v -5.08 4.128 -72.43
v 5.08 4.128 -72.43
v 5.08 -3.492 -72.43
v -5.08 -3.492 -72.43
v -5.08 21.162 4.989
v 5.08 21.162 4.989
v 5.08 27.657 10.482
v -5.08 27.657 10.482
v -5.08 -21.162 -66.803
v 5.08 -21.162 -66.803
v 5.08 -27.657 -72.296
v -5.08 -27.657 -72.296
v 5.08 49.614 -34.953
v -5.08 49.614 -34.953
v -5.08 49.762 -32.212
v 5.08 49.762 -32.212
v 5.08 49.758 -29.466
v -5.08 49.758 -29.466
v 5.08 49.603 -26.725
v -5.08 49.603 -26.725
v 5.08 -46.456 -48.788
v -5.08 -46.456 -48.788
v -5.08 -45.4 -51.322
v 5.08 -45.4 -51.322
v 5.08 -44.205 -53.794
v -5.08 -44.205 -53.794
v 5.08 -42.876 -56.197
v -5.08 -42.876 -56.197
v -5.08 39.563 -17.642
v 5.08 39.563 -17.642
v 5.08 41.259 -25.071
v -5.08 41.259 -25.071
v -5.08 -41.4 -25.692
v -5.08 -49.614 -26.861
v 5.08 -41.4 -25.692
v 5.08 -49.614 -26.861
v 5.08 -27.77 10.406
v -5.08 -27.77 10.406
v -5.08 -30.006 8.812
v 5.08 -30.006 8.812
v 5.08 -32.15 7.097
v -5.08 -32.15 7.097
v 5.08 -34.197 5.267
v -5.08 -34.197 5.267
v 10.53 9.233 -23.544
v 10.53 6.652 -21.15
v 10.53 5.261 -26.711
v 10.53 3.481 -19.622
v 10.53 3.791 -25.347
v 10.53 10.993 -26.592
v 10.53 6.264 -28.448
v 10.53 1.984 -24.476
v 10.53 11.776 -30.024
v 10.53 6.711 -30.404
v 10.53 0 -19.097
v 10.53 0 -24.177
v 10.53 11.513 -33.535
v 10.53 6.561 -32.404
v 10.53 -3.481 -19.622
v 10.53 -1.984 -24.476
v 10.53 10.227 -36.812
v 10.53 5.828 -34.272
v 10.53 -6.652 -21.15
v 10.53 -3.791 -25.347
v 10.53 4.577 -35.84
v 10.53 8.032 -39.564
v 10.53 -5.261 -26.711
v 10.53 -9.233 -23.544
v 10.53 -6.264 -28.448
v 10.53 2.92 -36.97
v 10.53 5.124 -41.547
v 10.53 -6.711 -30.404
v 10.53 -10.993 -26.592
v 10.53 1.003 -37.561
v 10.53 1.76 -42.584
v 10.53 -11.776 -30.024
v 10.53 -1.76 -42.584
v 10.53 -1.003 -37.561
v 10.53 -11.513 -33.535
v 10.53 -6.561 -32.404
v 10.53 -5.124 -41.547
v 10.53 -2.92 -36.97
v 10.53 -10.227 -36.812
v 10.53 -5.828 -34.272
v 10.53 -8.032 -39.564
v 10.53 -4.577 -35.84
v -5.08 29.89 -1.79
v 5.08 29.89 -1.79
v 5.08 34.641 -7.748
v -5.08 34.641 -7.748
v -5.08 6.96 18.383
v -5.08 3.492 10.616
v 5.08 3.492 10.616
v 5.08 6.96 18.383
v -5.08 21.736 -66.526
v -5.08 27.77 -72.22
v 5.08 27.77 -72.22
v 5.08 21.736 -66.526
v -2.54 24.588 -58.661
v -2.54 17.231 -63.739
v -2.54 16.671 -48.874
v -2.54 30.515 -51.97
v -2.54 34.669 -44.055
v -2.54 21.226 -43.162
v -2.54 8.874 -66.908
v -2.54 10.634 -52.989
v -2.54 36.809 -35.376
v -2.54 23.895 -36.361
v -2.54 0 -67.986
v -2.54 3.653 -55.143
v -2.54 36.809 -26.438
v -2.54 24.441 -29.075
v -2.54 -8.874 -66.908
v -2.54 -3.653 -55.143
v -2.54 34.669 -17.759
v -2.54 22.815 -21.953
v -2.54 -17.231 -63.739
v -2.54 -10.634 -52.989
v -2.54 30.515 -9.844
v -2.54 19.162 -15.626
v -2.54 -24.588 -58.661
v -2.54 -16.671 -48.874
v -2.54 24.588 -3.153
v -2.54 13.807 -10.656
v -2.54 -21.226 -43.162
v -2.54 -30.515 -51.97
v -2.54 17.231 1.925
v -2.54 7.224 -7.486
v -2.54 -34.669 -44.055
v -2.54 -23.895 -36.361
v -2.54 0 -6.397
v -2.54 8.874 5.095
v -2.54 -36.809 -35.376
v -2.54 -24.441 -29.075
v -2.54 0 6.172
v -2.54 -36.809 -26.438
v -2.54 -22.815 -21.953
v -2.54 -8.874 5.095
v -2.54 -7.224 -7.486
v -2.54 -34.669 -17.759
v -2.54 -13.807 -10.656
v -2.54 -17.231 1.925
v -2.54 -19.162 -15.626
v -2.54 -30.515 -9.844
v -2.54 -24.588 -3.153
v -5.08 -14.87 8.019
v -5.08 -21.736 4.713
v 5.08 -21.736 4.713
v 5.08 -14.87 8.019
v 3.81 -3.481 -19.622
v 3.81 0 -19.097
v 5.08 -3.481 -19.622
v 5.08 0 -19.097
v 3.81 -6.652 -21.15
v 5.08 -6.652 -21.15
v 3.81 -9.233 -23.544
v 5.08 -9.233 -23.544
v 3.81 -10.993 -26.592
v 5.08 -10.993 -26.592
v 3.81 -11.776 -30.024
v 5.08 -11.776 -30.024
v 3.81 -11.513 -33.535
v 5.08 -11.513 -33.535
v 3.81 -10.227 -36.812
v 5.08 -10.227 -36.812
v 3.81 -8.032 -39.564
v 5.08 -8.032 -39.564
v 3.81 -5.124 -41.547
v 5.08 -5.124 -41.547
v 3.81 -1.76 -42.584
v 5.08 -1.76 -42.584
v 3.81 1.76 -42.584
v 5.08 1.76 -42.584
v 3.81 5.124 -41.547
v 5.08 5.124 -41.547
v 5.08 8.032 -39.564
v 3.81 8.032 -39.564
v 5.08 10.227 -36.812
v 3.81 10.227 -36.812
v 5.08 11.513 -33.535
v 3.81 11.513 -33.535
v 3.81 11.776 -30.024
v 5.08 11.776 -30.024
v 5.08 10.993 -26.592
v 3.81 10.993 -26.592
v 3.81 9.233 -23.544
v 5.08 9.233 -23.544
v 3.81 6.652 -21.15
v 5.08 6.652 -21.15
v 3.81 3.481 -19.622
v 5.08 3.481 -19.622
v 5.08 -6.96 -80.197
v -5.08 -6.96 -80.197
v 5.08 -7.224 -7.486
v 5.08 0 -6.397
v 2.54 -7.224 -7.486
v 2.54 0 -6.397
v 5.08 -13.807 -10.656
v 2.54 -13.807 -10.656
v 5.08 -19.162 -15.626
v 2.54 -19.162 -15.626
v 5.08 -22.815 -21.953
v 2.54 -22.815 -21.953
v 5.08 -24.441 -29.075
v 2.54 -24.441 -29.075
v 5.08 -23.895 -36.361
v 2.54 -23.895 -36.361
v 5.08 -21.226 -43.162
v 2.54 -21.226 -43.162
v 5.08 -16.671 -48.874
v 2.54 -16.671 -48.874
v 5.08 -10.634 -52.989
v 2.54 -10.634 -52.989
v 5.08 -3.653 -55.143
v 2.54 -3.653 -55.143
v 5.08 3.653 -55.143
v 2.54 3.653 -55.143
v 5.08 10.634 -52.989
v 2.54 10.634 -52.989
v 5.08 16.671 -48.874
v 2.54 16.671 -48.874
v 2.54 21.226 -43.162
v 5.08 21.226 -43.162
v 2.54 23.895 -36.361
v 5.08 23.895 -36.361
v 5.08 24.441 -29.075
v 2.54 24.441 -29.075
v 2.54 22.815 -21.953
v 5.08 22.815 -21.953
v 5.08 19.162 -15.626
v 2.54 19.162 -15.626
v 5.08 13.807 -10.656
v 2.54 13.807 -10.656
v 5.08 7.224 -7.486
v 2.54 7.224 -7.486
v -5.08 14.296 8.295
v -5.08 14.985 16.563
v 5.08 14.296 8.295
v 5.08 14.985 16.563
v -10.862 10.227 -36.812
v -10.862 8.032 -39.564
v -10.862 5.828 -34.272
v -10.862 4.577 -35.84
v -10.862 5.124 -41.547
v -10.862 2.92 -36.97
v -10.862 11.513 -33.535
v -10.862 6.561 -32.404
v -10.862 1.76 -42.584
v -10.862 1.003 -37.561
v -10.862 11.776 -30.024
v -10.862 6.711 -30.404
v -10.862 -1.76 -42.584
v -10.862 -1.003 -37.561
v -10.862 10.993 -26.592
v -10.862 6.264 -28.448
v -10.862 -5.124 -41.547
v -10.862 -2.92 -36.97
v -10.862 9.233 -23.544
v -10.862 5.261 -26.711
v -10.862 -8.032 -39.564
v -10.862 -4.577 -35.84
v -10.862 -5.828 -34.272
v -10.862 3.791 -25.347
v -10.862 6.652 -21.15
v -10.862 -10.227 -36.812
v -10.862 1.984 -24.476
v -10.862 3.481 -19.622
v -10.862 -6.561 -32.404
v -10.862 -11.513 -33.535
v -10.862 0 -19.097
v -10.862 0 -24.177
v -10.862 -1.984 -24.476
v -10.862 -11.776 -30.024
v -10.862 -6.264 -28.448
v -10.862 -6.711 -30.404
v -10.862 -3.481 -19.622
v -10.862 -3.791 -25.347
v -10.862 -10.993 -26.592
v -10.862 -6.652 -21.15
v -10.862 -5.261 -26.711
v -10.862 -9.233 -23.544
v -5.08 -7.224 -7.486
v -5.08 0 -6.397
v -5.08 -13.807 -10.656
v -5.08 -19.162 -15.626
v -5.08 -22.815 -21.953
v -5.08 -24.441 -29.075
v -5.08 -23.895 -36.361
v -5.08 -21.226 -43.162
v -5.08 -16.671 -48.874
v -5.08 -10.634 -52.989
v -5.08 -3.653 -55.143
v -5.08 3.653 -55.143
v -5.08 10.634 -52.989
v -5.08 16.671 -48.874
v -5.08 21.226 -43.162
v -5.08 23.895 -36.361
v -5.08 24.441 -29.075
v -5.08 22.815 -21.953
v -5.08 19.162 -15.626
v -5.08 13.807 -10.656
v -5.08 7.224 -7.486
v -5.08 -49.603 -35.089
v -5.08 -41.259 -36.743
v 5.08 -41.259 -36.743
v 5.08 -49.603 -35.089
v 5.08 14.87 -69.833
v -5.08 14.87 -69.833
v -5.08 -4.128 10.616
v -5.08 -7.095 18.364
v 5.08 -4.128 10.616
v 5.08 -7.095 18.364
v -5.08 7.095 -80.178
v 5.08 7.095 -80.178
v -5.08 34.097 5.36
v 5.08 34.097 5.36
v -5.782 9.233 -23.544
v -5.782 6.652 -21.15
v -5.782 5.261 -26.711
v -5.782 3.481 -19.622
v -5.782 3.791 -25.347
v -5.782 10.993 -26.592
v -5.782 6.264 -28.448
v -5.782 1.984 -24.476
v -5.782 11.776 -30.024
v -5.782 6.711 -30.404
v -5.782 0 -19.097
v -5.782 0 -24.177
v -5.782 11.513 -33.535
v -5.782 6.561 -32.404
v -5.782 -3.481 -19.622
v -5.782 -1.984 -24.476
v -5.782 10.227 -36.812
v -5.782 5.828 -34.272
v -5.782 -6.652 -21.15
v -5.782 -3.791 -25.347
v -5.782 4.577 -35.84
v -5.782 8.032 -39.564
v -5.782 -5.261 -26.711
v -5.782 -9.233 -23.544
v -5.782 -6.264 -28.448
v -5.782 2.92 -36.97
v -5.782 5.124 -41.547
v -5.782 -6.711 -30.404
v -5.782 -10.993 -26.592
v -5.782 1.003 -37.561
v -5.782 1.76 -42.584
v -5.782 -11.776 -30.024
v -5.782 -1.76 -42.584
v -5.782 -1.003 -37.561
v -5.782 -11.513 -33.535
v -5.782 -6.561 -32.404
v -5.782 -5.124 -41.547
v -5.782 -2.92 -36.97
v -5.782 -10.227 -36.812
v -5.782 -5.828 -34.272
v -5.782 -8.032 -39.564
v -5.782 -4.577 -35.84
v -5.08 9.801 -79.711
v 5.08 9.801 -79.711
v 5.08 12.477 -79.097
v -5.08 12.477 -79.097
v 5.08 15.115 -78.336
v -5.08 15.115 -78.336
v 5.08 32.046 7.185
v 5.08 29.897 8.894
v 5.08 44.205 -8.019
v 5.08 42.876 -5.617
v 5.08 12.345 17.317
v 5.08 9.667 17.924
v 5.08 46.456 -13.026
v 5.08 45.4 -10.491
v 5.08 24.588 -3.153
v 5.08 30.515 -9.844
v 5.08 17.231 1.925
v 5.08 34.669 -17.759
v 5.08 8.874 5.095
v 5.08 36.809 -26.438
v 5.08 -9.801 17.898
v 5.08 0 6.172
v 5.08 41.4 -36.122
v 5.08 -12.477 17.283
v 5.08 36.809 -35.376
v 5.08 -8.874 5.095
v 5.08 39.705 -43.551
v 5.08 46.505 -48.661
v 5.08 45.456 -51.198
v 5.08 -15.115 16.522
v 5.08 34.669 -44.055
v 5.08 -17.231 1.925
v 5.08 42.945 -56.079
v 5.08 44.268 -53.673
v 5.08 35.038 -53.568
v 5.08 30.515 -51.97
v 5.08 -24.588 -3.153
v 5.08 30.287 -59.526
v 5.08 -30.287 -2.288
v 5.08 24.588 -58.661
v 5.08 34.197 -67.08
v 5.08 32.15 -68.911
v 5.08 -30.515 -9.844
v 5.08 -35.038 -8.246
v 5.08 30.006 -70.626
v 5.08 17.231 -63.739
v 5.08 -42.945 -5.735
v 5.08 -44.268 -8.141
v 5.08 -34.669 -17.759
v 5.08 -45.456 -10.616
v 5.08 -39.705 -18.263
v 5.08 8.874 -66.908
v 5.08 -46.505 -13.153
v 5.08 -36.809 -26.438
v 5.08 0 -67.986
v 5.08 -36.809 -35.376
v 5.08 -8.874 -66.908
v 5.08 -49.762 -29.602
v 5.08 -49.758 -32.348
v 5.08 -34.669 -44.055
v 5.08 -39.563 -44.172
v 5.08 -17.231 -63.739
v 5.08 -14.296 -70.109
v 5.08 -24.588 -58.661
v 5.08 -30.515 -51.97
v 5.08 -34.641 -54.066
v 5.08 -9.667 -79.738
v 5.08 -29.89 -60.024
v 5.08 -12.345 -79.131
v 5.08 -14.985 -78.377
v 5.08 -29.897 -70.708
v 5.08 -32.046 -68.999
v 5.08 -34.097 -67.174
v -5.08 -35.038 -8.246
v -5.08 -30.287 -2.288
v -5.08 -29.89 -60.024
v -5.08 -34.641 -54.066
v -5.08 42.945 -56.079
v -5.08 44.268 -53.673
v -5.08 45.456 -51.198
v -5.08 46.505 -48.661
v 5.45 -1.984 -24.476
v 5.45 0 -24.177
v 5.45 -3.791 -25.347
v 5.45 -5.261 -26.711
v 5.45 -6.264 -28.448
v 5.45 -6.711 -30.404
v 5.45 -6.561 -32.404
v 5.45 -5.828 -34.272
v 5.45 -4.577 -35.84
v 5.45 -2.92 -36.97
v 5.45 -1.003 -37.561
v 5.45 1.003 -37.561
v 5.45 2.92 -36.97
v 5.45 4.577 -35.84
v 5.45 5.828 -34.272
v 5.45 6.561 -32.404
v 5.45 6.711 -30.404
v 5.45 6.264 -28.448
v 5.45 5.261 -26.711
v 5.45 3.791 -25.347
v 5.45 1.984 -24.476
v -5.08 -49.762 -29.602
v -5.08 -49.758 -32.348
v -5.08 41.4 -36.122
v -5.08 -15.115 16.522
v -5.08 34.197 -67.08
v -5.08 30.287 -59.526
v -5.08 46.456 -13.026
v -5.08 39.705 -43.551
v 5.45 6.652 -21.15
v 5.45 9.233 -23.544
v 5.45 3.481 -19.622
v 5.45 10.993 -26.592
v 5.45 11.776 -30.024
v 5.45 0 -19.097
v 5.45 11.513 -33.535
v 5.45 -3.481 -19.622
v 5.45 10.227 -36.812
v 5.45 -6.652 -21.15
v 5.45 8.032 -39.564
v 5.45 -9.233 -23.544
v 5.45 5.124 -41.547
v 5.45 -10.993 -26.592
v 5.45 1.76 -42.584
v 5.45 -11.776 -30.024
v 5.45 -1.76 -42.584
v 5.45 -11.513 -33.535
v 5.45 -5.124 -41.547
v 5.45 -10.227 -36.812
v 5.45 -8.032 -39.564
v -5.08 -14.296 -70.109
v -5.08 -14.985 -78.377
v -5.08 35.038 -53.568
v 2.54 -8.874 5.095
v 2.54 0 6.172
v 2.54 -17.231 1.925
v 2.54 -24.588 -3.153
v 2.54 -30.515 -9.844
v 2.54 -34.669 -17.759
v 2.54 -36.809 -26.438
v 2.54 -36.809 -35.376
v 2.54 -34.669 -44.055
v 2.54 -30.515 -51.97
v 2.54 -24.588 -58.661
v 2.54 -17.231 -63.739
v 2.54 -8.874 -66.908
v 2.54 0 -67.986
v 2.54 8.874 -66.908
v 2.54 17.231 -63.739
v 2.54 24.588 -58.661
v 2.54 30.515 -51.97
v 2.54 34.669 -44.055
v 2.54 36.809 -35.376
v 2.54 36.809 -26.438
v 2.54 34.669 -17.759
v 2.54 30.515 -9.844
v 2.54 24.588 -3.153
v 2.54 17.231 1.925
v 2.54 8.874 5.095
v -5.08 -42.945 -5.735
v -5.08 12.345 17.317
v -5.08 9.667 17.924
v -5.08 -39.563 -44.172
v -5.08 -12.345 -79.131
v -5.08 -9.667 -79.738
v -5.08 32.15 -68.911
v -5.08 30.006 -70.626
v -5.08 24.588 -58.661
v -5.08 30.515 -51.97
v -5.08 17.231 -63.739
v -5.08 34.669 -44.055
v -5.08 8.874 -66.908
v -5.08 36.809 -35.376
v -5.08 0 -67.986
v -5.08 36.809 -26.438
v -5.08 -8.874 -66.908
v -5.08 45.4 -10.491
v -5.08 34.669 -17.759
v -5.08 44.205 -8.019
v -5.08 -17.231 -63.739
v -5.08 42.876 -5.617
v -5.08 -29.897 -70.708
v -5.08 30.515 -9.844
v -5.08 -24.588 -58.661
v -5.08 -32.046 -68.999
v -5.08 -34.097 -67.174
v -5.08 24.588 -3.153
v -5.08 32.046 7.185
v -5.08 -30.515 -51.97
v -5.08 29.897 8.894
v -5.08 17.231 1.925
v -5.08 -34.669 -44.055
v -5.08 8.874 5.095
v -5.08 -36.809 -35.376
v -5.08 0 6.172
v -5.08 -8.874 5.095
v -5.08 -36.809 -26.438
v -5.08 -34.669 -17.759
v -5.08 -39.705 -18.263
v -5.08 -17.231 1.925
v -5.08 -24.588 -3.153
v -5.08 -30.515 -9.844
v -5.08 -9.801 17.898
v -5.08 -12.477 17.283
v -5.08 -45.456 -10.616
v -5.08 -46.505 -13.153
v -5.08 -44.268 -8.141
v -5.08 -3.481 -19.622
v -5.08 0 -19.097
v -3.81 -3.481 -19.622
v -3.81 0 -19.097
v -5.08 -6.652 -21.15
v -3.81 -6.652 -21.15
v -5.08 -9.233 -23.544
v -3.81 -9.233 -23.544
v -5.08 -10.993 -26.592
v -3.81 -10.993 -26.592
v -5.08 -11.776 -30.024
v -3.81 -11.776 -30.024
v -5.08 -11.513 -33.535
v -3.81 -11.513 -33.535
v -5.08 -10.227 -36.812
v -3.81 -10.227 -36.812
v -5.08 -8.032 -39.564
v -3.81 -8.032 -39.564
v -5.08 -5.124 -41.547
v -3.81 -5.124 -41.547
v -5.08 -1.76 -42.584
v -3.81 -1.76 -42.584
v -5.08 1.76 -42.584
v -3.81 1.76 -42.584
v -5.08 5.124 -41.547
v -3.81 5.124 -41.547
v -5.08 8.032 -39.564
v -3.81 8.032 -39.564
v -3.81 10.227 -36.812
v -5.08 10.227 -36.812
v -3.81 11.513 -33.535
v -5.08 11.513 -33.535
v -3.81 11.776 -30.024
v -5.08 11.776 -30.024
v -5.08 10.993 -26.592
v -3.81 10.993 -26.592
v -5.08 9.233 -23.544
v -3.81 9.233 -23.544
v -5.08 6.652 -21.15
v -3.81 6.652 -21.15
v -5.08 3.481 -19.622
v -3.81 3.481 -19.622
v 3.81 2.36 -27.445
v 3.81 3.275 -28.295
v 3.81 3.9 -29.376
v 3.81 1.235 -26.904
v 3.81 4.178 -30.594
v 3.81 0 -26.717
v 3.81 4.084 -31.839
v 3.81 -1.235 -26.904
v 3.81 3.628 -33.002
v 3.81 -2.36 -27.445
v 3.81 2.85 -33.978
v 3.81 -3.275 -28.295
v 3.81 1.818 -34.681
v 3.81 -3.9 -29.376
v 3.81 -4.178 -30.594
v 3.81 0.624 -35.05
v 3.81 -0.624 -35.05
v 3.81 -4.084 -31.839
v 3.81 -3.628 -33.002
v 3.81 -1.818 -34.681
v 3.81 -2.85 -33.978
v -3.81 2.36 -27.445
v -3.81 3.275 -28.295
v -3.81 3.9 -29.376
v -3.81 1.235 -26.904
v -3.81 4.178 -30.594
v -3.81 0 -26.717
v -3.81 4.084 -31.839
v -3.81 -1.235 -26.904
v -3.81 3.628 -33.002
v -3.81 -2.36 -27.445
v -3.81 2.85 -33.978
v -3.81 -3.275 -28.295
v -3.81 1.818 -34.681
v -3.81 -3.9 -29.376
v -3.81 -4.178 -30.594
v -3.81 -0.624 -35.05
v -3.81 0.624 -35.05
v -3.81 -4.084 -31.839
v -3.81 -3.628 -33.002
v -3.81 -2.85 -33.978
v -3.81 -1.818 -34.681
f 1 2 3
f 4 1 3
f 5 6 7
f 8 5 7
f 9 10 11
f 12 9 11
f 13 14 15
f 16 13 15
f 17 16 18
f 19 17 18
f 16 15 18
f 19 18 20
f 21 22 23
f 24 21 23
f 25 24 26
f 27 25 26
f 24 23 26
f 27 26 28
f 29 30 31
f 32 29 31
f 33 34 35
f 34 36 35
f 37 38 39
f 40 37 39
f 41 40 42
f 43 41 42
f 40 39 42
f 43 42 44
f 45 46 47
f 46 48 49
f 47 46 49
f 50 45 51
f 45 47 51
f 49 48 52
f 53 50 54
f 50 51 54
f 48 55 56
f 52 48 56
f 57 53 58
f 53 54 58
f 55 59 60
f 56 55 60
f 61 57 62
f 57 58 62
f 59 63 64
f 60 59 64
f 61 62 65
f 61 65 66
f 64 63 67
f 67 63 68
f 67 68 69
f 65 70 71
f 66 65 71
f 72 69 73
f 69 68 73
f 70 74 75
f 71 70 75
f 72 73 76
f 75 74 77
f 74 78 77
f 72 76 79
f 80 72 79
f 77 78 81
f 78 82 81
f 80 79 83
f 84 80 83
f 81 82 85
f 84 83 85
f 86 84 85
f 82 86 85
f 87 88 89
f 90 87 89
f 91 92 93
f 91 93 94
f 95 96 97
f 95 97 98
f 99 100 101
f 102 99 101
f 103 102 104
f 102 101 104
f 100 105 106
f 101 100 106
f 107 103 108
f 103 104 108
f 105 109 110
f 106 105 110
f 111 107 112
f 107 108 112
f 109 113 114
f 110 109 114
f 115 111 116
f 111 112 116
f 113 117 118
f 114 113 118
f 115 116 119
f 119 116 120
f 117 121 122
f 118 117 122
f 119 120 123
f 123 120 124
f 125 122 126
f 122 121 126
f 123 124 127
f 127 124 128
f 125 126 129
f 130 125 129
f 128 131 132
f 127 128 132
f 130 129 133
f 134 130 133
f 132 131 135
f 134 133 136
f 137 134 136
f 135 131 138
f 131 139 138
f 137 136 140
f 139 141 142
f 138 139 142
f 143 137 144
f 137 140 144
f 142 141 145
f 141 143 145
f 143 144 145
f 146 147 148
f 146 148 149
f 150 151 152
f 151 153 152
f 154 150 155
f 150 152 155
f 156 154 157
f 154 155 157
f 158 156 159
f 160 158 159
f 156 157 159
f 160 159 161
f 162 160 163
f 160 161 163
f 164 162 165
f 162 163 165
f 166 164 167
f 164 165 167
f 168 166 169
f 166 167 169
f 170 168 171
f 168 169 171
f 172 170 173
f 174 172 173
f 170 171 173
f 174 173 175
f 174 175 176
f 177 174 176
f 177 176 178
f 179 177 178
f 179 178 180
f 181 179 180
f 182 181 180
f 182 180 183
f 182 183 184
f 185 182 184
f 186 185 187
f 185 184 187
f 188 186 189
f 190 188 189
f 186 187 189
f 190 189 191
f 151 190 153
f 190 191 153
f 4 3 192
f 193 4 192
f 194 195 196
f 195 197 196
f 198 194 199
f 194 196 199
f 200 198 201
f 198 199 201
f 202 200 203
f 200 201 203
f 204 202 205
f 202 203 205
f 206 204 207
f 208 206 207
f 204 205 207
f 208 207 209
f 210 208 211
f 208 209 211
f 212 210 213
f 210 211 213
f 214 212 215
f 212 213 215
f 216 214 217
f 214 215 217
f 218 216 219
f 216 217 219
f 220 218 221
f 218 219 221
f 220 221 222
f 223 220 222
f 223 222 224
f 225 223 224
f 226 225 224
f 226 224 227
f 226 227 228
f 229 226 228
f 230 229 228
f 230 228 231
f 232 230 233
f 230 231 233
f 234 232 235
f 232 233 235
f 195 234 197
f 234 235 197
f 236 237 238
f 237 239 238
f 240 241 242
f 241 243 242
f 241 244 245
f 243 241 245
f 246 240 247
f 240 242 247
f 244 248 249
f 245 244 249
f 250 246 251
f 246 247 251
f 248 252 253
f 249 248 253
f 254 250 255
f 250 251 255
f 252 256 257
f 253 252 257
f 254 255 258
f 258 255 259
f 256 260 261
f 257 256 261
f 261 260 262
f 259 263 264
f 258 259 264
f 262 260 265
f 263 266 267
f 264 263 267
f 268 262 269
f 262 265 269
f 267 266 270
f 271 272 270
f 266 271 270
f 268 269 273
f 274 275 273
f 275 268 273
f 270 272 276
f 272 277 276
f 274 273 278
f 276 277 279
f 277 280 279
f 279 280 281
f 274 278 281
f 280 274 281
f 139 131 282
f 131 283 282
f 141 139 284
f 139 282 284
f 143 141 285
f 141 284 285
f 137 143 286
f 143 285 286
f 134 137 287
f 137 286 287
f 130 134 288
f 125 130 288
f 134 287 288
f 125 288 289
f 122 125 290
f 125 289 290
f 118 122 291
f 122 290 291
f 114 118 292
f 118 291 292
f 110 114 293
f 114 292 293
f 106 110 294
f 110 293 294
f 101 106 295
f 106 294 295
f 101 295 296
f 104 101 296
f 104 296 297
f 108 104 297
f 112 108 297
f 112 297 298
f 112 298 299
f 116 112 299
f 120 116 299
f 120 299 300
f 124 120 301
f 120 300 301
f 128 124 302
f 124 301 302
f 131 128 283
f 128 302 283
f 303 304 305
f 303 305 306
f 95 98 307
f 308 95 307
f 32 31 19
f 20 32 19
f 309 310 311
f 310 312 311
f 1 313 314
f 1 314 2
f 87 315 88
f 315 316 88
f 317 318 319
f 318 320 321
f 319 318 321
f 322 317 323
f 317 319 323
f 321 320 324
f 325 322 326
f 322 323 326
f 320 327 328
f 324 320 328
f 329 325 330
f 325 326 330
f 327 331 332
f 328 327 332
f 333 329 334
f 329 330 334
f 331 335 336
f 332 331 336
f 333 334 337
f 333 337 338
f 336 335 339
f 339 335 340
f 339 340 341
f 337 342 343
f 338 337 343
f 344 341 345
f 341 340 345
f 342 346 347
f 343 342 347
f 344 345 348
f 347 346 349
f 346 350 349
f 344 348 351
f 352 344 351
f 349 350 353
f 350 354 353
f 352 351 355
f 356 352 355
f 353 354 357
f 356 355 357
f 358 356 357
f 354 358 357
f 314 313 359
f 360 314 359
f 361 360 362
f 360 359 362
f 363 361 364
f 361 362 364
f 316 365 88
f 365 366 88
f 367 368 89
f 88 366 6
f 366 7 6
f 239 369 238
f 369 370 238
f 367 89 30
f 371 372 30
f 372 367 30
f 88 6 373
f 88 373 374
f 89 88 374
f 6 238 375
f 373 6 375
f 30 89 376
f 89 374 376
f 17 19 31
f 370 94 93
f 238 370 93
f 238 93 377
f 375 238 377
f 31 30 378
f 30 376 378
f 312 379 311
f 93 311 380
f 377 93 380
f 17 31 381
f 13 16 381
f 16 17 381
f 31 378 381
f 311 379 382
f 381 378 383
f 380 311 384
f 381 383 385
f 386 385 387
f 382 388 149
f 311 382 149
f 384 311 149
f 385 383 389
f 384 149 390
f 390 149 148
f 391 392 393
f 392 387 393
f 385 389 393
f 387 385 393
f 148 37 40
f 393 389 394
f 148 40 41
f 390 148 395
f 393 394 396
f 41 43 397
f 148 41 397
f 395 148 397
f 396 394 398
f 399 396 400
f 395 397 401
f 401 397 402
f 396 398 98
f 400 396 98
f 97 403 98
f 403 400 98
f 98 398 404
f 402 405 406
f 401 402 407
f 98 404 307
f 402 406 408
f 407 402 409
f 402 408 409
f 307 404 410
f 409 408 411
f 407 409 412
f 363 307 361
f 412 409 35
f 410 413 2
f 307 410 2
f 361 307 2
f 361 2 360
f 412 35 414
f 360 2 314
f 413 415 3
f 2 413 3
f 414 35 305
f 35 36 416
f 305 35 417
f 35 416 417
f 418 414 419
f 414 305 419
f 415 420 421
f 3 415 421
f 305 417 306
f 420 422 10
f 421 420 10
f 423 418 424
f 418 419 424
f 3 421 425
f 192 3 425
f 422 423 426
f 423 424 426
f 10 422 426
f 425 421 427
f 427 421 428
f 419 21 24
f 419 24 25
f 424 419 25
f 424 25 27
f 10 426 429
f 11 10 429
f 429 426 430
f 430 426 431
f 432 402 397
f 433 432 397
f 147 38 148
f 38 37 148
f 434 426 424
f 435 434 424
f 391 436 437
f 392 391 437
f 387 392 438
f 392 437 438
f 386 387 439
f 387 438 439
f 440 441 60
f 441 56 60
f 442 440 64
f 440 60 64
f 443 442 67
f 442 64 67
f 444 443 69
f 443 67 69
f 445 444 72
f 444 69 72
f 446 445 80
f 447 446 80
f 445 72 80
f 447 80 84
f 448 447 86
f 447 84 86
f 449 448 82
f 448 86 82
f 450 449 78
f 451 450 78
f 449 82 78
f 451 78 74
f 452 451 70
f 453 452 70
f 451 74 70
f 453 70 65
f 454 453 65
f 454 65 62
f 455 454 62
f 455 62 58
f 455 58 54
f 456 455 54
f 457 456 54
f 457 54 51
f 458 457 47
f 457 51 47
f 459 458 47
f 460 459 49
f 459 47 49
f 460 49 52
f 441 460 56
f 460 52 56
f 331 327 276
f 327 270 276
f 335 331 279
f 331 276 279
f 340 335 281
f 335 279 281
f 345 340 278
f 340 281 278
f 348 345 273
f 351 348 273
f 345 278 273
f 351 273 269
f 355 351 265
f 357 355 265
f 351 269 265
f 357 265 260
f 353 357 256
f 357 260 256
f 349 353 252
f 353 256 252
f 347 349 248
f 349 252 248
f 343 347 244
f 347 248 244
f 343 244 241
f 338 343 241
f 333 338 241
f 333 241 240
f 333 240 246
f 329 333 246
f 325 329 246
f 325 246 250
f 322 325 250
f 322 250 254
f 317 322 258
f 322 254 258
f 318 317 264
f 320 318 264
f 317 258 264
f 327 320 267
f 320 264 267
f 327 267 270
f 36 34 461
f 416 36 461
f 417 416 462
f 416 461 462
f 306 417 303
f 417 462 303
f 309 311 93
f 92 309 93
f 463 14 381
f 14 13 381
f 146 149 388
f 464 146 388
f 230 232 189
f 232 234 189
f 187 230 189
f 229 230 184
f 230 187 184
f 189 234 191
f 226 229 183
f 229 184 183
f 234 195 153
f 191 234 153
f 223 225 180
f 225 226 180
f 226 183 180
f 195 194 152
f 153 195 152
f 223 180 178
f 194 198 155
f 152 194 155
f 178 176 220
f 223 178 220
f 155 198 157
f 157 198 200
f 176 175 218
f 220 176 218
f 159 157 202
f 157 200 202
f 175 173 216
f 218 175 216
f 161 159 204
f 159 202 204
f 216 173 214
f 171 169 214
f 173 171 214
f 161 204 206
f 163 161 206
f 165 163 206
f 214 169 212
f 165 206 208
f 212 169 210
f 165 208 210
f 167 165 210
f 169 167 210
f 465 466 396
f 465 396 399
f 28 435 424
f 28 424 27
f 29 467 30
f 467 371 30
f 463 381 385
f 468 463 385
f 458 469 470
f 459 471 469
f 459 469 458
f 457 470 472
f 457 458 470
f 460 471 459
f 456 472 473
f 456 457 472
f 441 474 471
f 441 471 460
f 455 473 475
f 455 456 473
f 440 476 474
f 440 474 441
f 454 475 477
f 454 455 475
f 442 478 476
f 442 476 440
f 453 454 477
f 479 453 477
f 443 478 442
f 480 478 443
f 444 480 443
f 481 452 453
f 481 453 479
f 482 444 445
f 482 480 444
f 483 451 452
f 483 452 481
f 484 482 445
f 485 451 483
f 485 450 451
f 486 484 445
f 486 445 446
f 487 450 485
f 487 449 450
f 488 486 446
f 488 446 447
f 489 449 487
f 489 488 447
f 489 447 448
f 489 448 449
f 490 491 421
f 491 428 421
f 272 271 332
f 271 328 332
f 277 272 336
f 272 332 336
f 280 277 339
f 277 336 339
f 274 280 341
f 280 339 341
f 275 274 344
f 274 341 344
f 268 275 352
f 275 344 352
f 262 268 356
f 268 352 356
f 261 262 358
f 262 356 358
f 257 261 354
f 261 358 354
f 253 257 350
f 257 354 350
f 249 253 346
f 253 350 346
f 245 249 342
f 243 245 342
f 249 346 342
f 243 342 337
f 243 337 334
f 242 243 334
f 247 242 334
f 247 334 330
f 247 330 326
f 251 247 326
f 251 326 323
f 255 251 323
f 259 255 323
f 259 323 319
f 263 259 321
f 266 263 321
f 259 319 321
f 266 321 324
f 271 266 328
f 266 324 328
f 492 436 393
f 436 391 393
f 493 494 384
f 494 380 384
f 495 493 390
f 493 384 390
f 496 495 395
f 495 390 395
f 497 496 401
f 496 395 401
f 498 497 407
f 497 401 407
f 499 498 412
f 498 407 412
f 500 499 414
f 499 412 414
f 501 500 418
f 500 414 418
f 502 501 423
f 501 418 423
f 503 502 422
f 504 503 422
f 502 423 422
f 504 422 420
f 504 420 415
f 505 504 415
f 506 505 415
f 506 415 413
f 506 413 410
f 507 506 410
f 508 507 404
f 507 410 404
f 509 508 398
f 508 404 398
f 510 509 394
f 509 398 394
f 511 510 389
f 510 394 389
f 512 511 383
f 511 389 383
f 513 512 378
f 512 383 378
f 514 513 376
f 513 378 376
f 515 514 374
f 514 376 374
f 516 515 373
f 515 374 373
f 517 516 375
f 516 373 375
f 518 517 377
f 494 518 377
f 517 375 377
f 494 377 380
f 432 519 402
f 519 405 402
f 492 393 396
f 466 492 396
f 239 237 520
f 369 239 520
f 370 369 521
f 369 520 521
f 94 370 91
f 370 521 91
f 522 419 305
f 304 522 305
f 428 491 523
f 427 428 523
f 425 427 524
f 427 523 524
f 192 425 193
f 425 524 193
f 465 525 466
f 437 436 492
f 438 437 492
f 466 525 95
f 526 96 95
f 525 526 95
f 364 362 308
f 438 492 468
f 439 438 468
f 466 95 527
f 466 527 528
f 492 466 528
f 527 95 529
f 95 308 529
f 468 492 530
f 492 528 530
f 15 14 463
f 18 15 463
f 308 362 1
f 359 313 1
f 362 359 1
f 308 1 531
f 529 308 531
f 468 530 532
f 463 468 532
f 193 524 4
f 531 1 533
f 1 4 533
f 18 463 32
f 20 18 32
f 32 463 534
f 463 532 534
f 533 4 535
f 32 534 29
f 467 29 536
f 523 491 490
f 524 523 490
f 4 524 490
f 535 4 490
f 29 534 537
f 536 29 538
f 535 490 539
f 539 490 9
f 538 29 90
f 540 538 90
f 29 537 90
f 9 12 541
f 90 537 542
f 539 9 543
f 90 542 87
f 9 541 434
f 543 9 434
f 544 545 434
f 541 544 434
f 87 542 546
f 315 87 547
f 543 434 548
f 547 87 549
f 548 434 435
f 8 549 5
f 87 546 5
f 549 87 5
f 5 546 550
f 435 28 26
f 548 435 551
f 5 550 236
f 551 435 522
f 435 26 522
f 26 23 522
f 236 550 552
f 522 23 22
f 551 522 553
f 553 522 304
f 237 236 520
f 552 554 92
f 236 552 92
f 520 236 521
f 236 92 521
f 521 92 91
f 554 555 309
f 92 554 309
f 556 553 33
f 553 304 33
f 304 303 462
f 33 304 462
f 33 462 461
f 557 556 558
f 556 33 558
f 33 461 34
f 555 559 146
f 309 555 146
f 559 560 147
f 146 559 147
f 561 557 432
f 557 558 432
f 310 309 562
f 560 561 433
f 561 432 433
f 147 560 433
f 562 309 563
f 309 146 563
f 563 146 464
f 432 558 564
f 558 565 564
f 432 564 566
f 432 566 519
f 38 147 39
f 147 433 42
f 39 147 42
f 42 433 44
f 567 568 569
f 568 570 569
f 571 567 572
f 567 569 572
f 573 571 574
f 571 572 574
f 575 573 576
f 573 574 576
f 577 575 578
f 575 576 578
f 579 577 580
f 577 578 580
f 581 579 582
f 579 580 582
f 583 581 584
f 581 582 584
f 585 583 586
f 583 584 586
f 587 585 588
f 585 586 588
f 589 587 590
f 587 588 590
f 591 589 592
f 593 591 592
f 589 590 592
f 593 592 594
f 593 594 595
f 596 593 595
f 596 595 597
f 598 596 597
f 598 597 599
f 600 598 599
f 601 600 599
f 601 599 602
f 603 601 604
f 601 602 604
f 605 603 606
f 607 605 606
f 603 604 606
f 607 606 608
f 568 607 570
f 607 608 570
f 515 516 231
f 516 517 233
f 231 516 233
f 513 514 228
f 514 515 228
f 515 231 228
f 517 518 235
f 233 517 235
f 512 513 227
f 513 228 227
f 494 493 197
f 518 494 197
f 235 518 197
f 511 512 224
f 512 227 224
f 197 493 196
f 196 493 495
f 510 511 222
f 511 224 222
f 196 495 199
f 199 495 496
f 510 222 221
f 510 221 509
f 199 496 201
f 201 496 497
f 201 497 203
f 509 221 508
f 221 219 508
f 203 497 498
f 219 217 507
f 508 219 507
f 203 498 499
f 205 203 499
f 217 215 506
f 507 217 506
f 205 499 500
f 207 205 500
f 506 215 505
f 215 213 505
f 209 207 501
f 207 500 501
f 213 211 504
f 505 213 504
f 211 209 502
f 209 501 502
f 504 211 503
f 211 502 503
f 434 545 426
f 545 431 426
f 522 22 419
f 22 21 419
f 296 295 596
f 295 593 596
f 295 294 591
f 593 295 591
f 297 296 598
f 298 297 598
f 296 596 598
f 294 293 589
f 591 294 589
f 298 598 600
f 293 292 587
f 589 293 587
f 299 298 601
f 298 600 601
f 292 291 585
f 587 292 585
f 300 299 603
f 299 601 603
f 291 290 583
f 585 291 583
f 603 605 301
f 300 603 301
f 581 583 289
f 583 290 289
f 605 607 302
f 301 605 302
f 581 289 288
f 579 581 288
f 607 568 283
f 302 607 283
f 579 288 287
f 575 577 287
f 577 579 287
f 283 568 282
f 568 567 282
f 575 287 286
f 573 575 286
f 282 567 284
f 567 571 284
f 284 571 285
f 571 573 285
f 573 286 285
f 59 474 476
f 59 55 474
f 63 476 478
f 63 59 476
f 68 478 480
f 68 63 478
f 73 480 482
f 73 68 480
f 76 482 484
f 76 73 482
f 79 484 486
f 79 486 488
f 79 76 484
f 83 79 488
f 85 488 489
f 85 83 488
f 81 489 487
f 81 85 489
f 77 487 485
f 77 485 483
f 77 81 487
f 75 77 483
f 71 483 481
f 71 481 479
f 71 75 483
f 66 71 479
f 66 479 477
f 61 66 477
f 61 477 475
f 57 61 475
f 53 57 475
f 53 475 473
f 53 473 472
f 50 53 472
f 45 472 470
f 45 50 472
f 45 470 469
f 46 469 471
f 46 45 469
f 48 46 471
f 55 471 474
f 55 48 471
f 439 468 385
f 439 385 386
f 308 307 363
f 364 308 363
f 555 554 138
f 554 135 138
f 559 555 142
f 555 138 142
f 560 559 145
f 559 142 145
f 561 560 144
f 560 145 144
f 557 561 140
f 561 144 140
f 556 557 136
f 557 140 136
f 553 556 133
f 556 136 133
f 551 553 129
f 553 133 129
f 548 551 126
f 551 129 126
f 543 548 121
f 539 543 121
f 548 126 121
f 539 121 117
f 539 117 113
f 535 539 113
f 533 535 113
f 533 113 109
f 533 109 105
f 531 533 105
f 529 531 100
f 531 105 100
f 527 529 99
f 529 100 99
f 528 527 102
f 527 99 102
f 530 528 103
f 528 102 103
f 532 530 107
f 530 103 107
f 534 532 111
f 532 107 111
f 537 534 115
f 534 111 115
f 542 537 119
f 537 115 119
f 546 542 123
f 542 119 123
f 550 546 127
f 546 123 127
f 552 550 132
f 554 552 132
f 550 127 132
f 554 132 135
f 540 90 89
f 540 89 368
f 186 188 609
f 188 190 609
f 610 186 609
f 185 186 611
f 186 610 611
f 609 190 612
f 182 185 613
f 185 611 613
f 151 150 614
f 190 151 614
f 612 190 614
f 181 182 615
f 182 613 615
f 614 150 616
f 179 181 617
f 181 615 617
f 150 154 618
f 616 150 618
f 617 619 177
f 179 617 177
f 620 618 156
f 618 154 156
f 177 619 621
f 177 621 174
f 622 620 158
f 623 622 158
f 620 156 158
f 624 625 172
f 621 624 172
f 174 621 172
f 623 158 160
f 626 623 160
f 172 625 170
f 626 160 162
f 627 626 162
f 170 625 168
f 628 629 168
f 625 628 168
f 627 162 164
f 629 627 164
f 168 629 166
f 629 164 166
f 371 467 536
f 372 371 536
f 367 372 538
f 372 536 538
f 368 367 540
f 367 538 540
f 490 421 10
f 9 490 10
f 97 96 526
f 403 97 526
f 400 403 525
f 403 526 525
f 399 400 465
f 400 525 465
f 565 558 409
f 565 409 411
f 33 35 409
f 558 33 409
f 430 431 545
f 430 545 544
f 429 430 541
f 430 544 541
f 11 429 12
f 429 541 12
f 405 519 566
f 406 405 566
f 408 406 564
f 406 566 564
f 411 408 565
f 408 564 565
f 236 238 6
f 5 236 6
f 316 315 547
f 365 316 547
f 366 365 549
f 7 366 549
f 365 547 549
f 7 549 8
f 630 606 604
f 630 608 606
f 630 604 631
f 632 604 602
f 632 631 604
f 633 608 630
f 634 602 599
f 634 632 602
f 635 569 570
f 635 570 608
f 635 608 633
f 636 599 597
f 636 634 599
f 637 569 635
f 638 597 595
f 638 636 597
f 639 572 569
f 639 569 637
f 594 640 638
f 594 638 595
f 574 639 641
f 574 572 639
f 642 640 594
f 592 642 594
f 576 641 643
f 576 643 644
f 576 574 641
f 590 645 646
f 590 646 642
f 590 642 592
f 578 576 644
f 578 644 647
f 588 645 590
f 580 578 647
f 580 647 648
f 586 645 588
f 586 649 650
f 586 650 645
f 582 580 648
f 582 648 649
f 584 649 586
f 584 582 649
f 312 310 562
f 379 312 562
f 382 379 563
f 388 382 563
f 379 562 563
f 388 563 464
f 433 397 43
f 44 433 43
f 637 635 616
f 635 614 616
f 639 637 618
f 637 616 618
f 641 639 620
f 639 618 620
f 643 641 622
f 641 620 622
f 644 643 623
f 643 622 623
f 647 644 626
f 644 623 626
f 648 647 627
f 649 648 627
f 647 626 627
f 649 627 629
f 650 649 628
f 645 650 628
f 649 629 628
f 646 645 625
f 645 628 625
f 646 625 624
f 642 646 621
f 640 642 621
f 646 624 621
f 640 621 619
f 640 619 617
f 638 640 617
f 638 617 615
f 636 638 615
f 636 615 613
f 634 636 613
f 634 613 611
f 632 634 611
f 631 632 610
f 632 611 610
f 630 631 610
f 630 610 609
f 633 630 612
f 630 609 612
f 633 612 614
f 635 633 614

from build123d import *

# Parameters (mm, degrees)
F0_W            = 5.08
F0_H            = 5.08
F0_W_2          = 7.62
F0_H_2          = 7.62
F3_DEPTH        = 12.7
F3_COPIES_COUNT = 14


# Not quite as in the source:
# - a feature of the source that left no trace in its solid (it failed there, or was rolled back) is left out
# - a pattern or mirror of a feature is missing from the dataset's text; its kind, count and spacing are read off the source's solid


with BuildPart() as f1:
    # F0 (on Front) → F1 (revolve)
    with BuildSketch(Plane.XZ):
        with Locations((7.990129427, -21.6374768325)):
            Rectangle(F0_W, F0_H)
    revolve(axis=Axis((0.4135672934, 0, -30.9069249779), (1, 0, 0)))


with BuildPart() as f1b:
    # F0 (on Front) → F1, piece 2 (revolve)
    with BuildSketch(Plane.XZ):
        Polygon((-5.7818528368, -24.1774768325), (-5.7818528368, -19.0974768325), (-10.5137031422, -19.0974768325), (-10.8618528368, -19.0974768325), (-10.8618528368, -24.1774768325), align=None)
    revolve(axis=Axis((0.4135672934, 0, -30.9069249779), (1, 0, 0)))


with BuildPart() as f1c:
    # F0 (on Front) → F1, piece 3 (revolve)
    with BuildSketch(Plane.XZ):
        Polygon((5.08, 18.8719633837), (-5.08, 18.8719633837), (-5.08, 6.1719633837), (-2.54, 6.1719633837), (-2.54, -6.3974768325), (-5.08, -6.3974768325), (-5.08, -19.0974768325), (-3.81, -19.0974768325), (3.81, -19.0974768325), (5.08, -19.0974768325), (5.08, -6.3974768325), (2.54, -6.3974768325), (2.54, 6.1719633837), (5.08, 6.1719633837), align=None)
        with Locations((0, -22.9074768325)):
            Rectangle(F0_W_2, F0_H_2)
    revolve(axis=Axis((0.4135672934, 0, -30.9069249779), (1, 0, 0)))

    # F2 (on Right) → F3 (cut, symmetric)
    with BuildSketch(Plane.YZ):
        Polygon((-7.3202843778, 18.9508479089), (-4.1284287343, 10.6158936396), (3.4915712657, 10.6158936396), (7.2140004486, 18.9508479089), (-7.2140004486, 18.9508479089), align=None)
    f3 = extrude(amount=F3_DEPTH, both=True, mode=Mode.SUBTRACT)

    # F3_copies: F3 ×14 about axis
    f3_copies_axis = Axis((0, 0, -30.906925), (1, 0, 0))
    for i in range(1, F3_COPIES_COUNT):
        add(f3.rotate(f3_copies_axis, i * 360 / F3_COPIES_COUNT), mode=Mode.SUBTRACT)


solid = Compound([f1.part, f1b.part, f1c.part])
